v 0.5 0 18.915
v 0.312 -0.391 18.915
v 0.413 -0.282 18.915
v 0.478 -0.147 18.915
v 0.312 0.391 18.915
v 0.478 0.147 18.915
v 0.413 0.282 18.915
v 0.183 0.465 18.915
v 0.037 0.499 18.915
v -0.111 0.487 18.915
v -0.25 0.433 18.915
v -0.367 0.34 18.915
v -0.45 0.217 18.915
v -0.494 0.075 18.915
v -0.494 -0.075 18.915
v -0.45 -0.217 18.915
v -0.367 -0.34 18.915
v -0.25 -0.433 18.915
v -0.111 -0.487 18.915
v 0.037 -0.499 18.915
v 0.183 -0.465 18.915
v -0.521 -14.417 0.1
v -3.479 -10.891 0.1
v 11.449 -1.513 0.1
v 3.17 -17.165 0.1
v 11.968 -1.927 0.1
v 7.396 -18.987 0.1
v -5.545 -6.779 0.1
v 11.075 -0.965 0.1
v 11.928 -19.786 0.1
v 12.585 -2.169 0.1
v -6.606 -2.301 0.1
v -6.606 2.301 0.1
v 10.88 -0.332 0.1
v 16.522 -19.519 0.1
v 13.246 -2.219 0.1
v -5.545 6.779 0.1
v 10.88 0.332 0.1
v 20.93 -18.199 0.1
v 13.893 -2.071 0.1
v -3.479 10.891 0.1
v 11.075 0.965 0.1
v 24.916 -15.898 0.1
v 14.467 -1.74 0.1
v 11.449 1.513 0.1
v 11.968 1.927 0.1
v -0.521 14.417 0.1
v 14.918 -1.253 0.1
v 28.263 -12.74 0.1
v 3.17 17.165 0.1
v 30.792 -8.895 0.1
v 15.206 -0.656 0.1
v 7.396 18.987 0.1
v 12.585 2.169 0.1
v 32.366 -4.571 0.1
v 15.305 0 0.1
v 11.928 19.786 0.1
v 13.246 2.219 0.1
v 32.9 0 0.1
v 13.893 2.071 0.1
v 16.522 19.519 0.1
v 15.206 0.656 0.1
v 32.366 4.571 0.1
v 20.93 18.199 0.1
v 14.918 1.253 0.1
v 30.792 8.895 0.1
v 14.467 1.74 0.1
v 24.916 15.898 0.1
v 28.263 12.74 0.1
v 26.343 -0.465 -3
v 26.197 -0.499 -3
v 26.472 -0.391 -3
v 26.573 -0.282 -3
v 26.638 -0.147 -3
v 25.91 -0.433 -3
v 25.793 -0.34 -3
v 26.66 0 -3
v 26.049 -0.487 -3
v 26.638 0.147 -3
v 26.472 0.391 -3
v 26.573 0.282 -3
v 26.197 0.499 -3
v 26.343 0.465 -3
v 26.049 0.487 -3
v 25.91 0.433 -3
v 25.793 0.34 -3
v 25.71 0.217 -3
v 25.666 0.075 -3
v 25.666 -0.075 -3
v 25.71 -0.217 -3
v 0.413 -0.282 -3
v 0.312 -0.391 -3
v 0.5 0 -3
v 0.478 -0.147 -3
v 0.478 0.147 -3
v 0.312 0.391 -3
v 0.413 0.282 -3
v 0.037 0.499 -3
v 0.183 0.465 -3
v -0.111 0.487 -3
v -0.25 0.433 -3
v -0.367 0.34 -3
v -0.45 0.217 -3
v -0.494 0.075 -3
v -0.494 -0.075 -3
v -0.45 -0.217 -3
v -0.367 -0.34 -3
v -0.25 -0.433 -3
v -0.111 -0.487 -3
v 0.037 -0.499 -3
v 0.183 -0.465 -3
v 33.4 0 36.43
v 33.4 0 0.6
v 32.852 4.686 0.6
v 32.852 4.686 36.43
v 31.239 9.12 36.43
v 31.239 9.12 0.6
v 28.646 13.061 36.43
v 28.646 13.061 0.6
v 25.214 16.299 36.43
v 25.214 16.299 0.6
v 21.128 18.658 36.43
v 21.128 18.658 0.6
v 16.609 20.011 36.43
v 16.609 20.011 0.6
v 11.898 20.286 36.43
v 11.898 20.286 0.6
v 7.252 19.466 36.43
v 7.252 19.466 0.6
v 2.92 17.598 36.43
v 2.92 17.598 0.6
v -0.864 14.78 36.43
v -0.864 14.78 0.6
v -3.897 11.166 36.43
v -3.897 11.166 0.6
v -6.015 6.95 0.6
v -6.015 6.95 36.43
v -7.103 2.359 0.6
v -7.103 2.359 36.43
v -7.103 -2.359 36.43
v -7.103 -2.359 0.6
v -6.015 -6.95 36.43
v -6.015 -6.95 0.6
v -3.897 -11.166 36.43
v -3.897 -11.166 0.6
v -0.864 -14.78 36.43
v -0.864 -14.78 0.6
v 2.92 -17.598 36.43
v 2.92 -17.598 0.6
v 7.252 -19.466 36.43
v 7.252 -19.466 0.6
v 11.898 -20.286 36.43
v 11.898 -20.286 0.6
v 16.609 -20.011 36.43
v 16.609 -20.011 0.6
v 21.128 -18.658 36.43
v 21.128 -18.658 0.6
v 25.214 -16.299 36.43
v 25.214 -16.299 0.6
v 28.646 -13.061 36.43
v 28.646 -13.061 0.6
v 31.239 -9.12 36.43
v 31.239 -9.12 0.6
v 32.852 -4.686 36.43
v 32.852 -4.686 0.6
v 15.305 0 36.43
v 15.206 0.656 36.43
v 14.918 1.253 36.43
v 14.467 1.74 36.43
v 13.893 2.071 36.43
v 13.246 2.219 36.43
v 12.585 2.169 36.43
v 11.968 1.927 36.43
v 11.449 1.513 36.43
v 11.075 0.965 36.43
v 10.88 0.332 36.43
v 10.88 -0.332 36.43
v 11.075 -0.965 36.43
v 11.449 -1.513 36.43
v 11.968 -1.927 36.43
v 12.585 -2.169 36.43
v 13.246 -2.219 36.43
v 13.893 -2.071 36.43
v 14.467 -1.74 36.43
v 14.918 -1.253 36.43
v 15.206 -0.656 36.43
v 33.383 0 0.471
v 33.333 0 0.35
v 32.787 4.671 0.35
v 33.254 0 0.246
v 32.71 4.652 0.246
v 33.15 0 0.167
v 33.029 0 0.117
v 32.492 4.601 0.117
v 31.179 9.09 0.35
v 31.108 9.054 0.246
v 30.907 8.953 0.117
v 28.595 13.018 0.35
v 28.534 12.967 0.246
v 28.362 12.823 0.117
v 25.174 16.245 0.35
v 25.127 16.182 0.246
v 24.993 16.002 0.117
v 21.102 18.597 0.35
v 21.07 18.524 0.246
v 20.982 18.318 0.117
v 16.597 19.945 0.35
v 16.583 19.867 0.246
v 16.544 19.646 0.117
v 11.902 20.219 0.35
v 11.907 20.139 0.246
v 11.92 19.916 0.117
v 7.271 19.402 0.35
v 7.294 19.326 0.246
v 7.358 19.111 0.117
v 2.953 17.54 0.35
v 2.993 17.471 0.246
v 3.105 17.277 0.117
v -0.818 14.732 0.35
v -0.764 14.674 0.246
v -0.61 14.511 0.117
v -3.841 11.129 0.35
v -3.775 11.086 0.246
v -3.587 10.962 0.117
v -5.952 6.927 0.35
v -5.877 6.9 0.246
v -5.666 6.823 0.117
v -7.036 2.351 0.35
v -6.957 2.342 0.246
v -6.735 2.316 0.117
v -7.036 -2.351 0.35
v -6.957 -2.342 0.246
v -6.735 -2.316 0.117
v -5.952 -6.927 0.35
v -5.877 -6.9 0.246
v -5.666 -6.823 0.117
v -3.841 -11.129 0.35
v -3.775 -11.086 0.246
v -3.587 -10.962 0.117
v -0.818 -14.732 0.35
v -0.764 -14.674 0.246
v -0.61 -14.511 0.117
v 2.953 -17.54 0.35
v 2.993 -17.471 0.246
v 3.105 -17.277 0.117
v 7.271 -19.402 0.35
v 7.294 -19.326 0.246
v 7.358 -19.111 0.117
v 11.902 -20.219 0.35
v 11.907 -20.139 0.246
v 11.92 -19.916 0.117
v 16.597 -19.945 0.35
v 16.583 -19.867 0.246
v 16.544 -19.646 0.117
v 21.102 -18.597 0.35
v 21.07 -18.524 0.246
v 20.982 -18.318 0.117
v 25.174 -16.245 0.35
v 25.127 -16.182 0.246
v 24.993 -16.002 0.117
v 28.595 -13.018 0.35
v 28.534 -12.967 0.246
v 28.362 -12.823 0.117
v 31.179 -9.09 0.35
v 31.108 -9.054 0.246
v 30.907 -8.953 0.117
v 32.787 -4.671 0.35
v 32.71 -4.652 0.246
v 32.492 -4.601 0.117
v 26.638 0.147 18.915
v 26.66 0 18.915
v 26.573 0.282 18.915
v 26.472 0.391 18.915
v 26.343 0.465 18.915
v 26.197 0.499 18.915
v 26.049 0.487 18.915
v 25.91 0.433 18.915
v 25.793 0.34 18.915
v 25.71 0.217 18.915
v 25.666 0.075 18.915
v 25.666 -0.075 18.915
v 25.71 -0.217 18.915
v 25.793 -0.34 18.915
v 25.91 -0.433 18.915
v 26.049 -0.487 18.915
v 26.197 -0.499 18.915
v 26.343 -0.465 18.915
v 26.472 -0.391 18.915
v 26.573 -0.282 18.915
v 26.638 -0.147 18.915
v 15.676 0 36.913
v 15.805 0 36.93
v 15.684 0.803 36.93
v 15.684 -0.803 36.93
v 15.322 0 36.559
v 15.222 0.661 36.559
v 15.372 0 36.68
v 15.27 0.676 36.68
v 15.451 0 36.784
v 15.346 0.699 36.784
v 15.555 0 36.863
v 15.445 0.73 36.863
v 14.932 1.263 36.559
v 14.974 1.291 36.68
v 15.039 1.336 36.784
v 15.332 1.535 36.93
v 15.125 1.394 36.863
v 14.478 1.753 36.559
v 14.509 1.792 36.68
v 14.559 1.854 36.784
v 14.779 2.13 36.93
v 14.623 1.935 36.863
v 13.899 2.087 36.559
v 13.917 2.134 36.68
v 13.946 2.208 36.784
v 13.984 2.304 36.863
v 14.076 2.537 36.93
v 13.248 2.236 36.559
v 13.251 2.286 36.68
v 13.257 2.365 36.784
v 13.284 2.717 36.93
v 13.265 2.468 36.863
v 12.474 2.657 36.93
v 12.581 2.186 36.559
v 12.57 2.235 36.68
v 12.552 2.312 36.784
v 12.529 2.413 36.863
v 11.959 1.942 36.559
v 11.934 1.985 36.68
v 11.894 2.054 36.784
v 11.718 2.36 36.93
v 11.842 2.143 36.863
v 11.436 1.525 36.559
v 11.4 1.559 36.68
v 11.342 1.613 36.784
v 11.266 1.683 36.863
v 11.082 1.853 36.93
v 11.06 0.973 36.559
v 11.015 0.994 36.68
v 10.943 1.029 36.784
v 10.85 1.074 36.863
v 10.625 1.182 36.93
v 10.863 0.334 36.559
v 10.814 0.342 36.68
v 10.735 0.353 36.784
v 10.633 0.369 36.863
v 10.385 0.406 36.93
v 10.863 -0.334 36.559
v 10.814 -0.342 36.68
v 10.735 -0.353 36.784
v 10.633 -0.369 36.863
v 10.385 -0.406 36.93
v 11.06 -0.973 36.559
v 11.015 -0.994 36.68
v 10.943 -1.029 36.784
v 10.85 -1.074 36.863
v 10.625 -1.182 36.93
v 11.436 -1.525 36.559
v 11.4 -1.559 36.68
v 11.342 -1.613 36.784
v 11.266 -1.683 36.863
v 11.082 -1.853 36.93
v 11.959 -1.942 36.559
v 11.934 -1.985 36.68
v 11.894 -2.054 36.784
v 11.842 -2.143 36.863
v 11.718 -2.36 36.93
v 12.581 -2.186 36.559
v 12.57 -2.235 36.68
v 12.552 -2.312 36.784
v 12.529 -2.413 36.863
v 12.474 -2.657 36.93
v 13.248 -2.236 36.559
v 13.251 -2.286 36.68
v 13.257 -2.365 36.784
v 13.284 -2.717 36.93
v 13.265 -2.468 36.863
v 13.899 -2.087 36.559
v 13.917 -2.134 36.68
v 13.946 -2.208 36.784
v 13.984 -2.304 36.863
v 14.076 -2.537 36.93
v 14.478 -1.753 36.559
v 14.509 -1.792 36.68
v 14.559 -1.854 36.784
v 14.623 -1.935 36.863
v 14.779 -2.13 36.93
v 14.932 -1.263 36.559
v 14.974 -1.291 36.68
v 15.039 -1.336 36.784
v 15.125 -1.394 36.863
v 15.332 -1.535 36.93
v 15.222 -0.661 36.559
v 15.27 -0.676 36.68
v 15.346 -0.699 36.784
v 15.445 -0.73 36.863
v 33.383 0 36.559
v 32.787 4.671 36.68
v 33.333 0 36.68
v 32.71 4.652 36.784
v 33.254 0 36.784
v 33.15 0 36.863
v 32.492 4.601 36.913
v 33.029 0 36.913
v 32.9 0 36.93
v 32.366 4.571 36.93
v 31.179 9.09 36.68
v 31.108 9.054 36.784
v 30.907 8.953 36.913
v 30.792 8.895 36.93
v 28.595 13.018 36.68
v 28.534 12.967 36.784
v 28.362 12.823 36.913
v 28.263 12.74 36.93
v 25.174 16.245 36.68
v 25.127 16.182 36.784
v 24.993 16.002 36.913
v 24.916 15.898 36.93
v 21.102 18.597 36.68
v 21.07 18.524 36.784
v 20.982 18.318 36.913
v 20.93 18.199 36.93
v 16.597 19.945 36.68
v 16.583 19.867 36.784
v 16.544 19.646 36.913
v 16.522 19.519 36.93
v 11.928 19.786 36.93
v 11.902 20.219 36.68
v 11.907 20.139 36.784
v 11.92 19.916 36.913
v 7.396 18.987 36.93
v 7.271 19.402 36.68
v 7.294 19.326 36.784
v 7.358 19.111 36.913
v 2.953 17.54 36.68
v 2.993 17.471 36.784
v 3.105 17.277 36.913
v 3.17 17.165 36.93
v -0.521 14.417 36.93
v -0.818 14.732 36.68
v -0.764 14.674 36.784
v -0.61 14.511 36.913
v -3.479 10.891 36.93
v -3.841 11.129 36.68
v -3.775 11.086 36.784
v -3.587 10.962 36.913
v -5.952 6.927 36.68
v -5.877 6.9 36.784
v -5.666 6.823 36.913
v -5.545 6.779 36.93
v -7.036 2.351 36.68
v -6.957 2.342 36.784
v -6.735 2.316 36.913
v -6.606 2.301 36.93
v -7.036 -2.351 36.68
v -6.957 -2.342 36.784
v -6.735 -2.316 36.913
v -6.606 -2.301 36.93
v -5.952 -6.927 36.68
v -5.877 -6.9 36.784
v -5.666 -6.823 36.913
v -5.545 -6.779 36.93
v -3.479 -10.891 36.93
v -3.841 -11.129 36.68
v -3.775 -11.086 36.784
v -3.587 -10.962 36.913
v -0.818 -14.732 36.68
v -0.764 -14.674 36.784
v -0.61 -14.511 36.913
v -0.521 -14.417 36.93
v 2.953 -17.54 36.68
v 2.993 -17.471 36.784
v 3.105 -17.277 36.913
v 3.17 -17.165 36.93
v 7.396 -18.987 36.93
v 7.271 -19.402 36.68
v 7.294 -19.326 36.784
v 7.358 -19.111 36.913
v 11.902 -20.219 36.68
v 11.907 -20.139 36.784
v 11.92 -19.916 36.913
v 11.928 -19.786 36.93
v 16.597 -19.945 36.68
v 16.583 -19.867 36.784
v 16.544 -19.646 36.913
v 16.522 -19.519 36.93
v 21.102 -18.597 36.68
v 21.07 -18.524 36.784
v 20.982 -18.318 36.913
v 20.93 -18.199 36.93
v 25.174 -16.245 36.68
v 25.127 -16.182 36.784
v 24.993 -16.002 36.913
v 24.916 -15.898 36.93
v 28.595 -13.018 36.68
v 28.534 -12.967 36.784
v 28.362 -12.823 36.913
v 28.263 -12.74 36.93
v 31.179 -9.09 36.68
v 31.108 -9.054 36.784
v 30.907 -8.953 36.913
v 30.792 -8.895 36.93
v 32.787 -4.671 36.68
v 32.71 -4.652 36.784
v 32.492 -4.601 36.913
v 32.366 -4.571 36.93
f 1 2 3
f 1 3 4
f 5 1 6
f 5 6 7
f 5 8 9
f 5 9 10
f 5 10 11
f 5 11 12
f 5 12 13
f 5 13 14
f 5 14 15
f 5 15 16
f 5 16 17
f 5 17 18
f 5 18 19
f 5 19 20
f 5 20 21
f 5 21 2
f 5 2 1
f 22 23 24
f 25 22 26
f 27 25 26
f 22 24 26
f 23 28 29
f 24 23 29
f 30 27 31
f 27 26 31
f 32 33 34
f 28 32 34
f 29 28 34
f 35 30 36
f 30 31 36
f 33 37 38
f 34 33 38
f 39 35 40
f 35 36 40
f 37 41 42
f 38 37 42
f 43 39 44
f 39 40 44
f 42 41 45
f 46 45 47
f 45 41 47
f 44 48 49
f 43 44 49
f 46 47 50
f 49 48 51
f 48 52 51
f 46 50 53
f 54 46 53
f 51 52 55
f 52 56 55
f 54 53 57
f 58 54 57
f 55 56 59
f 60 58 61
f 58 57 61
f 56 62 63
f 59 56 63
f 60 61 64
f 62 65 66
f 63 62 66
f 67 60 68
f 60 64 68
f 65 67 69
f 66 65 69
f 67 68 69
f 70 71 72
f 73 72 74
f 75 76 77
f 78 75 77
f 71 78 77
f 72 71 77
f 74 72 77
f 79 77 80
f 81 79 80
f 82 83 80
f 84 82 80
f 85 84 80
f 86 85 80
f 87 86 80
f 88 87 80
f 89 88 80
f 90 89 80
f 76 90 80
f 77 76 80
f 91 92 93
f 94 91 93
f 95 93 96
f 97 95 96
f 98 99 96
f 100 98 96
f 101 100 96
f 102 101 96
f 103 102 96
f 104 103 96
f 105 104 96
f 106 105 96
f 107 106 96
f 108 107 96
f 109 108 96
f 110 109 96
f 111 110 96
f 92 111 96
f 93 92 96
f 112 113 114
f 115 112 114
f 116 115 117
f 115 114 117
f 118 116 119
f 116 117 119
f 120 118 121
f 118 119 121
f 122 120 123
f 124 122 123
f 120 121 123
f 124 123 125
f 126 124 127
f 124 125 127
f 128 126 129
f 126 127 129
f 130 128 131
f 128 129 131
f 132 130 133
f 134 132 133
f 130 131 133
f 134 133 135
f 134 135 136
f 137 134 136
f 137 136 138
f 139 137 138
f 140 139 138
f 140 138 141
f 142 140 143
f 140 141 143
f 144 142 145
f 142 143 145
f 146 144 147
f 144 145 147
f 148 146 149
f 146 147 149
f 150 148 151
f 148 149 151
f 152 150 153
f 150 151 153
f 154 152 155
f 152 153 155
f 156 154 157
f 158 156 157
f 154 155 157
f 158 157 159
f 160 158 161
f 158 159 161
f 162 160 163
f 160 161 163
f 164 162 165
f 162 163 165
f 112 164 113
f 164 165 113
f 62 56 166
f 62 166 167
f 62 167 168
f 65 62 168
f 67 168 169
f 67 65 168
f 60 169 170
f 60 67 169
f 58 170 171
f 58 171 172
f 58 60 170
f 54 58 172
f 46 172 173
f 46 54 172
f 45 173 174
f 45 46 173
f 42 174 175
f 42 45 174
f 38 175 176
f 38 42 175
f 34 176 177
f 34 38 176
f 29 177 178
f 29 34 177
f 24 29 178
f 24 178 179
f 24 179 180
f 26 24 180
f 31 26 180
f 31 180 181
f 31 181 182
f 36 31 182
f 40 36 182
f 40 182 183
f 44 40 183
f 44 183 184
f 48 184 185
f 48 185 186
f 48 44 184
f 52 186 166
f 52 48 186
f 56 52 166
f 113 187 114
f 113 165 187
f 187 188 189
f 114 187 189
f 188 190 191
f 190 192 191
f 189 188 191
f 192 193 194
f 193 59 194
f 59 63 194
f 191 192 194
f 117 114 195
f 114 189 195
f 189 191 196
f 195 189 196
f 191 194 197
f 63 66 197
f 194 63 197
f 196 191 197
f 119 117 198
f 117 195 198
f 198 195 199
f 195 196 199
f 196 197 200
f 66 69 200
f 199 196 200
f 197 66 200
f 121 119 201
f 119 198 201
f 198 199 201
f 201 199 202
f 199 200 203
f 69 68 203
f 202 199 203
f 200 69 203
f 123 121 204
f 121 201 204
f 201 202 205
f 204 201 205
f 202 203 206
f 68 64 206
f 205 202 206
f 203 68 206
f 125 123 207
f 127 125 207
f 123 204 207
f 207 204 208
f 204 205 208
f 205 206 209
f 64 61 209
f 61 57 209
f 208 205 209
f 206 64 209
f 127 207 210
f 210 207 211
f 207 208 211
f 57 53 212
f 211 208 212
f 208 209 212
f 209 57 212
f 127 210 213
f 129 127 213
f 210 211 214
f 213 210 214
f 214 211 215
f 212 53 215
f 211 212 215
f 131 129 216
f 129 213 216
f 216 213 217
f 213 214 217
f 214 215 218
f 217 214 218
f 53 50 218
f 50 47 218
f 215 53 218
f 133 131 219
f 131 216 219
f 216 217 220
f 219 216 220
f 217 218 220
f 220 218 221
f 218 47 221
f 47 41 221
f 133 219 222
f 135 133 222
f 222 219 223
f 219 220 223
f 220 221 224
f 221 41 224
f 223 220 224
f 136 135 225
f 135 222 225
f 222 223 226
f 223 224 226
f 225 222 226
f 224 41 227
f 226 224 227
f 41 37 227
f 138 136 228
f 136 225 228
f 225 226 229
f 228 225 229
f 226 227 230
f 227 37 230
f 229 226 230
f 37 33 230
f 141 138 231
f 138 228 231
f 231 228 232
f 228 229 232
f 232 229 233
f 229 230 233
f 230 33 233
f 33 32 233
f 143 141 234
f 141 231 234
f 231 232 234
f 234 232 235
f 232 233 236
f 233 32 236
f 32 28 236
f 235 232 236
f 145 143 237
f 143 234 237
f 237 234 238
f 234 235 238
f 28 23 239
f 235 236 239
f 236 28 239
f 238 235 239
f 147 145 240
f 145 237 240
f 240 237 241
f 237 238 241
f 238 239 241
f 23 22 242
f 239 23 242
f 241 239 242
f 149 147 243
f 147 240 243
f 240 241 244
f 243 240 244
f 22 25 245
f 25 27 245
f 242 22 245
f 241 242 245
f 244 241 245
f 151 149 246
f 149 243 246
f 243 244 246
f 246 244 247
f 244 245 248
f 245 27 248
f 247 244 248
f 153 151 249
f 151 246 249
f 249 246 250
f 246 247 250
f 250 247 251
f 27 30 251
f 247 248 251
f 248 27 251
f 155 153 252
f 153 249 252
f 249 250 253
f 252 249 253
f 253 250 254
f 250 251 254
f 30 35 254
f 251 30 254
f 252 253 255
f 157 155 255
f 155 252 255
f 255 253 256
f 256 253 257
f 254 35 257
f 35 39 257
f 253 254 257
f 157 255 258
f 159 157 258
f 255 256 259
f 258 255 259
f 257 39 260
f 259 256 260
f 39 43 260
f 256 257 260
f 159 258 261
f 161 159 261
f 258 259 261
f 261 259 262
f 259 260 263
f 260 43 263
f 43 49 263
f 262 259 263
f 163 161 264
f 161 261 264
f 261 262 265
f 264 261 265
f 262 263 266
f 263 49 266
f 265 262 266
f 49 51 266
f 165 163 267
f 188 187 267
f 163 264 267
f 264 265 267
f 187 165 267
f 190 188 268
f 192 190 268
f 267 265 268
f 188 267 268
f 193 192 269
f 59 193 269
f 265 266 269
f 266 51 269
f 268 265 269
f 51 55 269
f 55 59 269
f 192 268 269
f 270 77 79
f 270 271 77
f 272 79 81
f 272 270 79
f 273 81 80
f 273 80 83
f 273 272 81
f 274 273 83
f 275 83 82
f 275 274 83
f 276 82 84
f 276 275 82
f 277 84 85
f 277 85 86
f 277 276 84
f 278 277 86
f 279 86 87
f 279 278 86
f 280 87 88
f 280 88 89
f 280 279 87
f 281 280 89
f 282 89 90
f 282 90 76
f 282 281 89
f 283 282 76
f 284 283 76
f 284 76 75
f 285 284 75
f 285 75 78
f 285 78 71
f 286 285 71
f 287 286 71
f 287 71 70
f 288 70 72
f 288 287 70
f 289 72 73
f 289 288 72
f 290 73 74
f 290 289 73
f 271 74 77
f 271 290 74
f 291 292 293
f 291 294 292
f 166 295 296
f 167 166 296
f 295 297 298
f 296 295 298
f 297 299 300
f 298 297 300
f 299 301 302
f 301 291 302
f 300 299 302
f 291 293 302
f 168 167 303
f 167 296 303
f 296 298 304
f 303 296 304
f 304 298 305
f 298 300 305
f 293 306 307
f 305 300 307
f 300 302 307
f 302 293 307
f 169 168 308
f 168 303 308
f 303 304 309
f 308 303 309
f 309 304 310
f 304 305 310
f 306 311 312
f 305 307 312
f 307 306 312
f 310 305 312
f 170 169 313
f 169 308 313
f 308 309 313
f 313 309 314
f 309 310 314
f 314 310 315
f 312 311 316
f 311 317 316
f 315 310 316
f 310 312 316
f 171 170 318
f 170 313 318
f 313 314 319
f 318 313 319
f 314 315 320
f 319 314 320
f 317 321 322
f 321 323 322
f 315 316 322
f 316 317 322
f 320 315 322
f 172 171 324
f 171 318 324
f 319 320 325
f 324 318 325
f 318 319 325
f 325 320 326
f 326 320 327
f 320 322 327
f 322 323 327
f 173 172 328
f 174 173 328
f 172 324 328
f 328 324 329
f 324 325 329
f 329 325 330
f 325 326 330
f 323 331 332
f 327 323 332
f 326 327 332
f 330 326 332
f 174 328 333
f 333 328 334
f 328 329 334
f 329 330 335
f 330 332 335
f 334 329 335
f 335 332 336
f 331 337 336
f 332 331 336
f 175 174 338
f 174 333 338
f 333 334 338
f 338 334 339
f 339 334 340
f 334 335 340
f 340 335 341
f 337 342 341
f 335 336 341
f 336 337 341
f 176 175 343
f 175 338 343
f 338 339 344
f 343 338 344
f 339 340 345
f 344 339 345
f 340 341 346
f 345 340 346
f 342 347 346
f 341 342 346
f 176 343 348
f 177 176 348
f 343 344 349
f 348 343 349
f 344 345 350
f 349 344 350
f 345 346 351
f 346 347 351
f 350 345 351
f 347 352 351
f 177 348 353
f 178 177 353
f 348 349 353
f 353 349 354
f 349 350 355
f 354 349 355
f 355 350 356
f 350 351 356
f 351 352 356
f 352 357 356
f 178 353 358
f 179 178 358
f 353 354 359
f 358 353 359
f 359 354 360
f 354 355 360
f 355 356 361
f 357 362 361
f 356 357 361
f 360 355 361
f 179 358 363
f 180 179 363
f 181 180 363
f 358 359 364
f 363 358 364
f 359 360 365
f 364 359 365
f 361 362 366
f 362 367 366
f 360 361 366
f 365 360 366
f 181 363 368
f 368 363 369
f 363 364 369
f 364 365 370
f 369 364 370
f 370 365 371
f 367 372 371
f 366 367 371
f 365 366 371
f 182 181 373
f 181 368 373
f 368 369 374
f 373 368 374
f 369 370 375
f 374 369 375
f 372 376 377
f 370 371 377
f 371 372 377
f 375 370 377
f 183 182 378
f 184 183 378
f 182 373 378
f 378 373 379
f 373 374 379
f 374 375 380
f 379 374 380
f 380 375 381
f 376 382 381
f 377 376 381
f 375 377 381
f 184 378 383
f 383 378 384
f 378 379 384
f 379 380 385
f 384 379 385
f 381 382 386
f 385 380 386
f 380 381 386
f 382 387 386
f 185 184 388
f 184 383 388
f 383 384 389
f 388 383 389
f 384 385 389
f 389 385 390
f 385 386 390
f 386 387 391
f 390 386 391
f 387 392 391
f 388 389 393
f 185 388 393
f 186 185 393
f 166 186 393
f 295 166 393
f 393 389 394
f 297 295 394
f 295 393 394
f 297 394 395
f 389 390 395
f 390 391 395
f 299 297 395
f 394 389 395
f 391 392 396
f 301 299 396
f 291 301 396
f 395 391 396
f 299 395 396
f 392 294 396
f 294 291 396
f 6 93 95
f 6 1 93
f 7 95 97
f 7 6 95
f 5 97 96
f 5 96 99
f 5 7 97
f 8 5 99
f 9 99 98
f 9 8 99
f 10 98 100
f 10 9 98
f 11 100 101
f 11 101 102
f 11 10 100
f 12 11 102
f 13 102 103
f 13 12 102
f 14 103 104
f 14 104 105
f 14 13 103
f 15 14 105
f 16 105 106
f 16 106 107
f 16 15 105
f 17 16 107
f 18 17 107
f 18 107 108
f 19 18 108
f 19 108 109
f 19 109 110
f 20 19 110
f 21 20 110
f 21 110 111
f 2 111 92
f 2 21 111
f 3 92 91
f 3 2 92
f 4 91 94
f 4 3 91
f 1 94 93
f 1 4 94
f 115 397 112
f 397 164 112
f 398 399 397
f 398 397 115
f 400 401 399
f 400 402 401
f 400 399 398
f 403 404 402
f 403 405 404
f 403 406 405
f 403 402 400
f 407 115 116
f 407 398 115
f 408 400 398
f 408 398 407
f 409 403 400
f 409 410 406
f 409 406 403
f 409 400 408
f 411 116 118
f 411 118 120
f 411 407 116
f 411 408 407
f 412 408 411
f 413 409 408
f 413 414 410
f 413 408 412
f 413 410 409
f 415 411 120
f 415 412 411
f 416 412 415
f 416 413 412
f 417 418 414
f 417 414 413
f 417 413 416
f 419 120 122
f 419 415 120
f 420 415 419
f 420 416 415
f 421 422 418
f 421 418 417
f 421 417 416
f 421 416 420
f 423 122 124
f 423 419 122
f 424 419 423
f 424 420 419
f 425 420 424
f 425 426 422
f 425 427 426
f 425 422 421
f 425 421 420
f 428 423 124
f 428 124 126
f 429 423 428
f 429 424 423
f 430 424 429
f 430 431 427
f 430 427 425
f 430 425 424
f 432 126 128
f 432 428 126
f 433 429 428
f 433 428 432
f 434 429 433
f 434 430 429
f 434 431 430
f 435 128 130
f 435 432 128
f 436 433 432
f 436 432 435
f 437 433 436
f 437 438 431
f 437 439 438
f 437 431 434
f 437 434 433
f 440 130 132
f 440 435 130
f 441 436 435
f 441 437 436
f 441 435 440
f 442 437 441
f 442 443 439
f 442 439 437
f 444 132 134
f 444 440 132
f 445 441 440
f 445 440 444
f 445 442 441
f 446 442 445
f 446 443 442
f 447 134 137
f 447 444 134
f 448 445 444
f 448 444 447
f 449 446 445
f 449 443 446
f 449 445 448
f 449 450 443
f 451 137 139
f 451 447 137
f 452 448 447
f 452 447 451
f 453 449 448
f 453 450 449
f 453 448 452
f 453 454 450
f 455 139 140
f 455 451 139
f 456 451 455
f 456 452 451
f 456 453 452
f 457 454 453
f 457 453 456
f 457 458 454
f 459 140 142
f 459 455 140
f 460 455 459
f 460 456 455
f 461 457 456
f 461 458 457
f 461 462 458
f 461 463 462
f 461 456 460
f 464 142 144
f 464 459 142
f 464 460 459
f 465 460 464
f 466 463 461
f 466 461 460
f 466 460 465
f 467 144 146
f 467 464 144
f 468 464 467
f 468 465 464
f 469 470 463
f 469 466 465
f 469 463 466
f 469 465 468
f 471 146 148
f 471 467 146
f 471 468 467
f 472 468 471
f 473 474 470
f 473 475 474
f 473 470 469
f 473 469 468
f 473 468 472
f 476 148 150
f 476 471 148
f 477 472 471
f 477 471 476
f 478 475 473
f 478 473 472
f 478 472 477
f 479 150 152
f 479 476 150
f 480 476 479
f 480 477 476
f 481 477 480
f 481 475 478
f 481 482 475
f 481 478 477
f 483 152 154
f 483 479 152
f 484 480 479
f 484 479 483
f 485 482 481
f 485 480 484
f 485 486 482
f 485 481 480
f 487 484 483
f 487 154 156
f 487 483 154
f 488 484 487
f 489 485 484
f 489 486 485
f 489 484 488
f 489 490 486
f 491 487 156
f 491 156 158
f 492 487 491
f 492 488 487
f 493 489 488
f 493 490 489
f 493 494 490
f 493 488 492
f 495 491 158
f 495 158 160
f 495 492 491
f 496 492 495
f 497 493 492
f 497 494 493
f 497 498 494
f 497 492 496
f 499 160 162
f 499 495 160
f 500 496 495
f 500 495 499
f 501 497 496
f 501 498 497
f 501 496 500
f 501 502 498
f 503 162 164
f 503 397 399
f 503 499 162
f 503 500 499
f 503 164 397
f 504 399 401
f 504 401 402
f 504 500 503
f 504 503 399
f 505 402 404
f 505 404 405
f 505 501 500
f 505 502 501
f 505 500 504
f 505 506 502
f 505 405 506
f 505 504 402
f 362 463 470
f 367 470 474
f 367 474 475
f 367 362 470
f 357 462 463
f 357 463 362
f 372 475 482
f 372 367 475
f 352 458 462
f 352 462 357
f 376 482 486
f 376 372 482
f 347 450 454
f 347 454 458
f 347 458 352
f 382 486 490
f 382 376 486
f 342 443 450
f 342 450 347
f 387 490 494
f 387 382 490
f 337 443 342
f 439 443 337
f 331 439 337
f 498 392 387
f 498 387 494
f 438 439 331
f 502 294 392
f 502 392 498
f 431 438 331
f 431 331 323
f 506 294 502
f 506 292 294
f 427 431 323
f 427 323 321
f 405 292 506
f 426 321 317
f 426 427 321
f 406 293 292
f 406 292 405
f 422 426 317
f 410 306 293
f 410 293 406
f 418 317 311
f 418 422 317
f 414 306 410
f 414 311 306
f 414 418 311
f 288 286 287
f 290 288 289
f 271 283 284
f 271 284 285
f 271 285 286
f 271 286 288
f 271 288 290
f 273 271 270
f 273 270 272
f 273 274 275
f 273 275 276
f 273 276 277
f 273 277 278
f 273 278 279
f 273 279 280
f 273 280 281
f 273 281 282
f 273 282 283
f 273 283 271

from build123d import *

# Parameters (mm, degrees)
SKETCH001_R       = 0.5
PAD001_DEPTH      = 18.415
PAD001_DEPTH_BACK = 3.5
SKETCH_R          = 20.32
SKETCH_R_2        = 2.225
PAD_DEPTH         = 36.83
FILLET_R          = 0.5


with BuildPart() as pad001:
    # Sketch001 → Pad001 (new body, two sides)
    with BuildSketch(Plane.XY.offset(0.5)) as pad001_sk:
        Circle(SKETCH001_R)
        with Locations((26.16, 0)):
            Circle(SKETCH001_R)
    extrude(amount=PAD001_DEPTH)
    extrude(pad001_sk.sketch, amount=-PAD001_DEPTH_BACK)


with BuildPart() as fillet_body:
    # Sketch → Pad (new body)
    with BuildSketch(Plane.XY.offset(0.1)):
        with Locations((13.08, 0)):
            Circle(SKETCH_R)
        with Locations((13.08, 0)):
            Circle(SKETCH_R_2, mode=Mode.SUBTRACT)
    extrude(amount=PAD_DEPTH)

    # Fillet
    fillet_edges = [fillet_body.edges().sort_by_distance(p)[0] for p in [
        (10.855, 0, 36.93),
        (-7.24, 0, 36.93),
        (-7.24, 0, 0.1),
    ]]
    fillet(fillet_edges, radius=FILLET_R)


solid = Compound([pad001.part, fillet_body.part])
